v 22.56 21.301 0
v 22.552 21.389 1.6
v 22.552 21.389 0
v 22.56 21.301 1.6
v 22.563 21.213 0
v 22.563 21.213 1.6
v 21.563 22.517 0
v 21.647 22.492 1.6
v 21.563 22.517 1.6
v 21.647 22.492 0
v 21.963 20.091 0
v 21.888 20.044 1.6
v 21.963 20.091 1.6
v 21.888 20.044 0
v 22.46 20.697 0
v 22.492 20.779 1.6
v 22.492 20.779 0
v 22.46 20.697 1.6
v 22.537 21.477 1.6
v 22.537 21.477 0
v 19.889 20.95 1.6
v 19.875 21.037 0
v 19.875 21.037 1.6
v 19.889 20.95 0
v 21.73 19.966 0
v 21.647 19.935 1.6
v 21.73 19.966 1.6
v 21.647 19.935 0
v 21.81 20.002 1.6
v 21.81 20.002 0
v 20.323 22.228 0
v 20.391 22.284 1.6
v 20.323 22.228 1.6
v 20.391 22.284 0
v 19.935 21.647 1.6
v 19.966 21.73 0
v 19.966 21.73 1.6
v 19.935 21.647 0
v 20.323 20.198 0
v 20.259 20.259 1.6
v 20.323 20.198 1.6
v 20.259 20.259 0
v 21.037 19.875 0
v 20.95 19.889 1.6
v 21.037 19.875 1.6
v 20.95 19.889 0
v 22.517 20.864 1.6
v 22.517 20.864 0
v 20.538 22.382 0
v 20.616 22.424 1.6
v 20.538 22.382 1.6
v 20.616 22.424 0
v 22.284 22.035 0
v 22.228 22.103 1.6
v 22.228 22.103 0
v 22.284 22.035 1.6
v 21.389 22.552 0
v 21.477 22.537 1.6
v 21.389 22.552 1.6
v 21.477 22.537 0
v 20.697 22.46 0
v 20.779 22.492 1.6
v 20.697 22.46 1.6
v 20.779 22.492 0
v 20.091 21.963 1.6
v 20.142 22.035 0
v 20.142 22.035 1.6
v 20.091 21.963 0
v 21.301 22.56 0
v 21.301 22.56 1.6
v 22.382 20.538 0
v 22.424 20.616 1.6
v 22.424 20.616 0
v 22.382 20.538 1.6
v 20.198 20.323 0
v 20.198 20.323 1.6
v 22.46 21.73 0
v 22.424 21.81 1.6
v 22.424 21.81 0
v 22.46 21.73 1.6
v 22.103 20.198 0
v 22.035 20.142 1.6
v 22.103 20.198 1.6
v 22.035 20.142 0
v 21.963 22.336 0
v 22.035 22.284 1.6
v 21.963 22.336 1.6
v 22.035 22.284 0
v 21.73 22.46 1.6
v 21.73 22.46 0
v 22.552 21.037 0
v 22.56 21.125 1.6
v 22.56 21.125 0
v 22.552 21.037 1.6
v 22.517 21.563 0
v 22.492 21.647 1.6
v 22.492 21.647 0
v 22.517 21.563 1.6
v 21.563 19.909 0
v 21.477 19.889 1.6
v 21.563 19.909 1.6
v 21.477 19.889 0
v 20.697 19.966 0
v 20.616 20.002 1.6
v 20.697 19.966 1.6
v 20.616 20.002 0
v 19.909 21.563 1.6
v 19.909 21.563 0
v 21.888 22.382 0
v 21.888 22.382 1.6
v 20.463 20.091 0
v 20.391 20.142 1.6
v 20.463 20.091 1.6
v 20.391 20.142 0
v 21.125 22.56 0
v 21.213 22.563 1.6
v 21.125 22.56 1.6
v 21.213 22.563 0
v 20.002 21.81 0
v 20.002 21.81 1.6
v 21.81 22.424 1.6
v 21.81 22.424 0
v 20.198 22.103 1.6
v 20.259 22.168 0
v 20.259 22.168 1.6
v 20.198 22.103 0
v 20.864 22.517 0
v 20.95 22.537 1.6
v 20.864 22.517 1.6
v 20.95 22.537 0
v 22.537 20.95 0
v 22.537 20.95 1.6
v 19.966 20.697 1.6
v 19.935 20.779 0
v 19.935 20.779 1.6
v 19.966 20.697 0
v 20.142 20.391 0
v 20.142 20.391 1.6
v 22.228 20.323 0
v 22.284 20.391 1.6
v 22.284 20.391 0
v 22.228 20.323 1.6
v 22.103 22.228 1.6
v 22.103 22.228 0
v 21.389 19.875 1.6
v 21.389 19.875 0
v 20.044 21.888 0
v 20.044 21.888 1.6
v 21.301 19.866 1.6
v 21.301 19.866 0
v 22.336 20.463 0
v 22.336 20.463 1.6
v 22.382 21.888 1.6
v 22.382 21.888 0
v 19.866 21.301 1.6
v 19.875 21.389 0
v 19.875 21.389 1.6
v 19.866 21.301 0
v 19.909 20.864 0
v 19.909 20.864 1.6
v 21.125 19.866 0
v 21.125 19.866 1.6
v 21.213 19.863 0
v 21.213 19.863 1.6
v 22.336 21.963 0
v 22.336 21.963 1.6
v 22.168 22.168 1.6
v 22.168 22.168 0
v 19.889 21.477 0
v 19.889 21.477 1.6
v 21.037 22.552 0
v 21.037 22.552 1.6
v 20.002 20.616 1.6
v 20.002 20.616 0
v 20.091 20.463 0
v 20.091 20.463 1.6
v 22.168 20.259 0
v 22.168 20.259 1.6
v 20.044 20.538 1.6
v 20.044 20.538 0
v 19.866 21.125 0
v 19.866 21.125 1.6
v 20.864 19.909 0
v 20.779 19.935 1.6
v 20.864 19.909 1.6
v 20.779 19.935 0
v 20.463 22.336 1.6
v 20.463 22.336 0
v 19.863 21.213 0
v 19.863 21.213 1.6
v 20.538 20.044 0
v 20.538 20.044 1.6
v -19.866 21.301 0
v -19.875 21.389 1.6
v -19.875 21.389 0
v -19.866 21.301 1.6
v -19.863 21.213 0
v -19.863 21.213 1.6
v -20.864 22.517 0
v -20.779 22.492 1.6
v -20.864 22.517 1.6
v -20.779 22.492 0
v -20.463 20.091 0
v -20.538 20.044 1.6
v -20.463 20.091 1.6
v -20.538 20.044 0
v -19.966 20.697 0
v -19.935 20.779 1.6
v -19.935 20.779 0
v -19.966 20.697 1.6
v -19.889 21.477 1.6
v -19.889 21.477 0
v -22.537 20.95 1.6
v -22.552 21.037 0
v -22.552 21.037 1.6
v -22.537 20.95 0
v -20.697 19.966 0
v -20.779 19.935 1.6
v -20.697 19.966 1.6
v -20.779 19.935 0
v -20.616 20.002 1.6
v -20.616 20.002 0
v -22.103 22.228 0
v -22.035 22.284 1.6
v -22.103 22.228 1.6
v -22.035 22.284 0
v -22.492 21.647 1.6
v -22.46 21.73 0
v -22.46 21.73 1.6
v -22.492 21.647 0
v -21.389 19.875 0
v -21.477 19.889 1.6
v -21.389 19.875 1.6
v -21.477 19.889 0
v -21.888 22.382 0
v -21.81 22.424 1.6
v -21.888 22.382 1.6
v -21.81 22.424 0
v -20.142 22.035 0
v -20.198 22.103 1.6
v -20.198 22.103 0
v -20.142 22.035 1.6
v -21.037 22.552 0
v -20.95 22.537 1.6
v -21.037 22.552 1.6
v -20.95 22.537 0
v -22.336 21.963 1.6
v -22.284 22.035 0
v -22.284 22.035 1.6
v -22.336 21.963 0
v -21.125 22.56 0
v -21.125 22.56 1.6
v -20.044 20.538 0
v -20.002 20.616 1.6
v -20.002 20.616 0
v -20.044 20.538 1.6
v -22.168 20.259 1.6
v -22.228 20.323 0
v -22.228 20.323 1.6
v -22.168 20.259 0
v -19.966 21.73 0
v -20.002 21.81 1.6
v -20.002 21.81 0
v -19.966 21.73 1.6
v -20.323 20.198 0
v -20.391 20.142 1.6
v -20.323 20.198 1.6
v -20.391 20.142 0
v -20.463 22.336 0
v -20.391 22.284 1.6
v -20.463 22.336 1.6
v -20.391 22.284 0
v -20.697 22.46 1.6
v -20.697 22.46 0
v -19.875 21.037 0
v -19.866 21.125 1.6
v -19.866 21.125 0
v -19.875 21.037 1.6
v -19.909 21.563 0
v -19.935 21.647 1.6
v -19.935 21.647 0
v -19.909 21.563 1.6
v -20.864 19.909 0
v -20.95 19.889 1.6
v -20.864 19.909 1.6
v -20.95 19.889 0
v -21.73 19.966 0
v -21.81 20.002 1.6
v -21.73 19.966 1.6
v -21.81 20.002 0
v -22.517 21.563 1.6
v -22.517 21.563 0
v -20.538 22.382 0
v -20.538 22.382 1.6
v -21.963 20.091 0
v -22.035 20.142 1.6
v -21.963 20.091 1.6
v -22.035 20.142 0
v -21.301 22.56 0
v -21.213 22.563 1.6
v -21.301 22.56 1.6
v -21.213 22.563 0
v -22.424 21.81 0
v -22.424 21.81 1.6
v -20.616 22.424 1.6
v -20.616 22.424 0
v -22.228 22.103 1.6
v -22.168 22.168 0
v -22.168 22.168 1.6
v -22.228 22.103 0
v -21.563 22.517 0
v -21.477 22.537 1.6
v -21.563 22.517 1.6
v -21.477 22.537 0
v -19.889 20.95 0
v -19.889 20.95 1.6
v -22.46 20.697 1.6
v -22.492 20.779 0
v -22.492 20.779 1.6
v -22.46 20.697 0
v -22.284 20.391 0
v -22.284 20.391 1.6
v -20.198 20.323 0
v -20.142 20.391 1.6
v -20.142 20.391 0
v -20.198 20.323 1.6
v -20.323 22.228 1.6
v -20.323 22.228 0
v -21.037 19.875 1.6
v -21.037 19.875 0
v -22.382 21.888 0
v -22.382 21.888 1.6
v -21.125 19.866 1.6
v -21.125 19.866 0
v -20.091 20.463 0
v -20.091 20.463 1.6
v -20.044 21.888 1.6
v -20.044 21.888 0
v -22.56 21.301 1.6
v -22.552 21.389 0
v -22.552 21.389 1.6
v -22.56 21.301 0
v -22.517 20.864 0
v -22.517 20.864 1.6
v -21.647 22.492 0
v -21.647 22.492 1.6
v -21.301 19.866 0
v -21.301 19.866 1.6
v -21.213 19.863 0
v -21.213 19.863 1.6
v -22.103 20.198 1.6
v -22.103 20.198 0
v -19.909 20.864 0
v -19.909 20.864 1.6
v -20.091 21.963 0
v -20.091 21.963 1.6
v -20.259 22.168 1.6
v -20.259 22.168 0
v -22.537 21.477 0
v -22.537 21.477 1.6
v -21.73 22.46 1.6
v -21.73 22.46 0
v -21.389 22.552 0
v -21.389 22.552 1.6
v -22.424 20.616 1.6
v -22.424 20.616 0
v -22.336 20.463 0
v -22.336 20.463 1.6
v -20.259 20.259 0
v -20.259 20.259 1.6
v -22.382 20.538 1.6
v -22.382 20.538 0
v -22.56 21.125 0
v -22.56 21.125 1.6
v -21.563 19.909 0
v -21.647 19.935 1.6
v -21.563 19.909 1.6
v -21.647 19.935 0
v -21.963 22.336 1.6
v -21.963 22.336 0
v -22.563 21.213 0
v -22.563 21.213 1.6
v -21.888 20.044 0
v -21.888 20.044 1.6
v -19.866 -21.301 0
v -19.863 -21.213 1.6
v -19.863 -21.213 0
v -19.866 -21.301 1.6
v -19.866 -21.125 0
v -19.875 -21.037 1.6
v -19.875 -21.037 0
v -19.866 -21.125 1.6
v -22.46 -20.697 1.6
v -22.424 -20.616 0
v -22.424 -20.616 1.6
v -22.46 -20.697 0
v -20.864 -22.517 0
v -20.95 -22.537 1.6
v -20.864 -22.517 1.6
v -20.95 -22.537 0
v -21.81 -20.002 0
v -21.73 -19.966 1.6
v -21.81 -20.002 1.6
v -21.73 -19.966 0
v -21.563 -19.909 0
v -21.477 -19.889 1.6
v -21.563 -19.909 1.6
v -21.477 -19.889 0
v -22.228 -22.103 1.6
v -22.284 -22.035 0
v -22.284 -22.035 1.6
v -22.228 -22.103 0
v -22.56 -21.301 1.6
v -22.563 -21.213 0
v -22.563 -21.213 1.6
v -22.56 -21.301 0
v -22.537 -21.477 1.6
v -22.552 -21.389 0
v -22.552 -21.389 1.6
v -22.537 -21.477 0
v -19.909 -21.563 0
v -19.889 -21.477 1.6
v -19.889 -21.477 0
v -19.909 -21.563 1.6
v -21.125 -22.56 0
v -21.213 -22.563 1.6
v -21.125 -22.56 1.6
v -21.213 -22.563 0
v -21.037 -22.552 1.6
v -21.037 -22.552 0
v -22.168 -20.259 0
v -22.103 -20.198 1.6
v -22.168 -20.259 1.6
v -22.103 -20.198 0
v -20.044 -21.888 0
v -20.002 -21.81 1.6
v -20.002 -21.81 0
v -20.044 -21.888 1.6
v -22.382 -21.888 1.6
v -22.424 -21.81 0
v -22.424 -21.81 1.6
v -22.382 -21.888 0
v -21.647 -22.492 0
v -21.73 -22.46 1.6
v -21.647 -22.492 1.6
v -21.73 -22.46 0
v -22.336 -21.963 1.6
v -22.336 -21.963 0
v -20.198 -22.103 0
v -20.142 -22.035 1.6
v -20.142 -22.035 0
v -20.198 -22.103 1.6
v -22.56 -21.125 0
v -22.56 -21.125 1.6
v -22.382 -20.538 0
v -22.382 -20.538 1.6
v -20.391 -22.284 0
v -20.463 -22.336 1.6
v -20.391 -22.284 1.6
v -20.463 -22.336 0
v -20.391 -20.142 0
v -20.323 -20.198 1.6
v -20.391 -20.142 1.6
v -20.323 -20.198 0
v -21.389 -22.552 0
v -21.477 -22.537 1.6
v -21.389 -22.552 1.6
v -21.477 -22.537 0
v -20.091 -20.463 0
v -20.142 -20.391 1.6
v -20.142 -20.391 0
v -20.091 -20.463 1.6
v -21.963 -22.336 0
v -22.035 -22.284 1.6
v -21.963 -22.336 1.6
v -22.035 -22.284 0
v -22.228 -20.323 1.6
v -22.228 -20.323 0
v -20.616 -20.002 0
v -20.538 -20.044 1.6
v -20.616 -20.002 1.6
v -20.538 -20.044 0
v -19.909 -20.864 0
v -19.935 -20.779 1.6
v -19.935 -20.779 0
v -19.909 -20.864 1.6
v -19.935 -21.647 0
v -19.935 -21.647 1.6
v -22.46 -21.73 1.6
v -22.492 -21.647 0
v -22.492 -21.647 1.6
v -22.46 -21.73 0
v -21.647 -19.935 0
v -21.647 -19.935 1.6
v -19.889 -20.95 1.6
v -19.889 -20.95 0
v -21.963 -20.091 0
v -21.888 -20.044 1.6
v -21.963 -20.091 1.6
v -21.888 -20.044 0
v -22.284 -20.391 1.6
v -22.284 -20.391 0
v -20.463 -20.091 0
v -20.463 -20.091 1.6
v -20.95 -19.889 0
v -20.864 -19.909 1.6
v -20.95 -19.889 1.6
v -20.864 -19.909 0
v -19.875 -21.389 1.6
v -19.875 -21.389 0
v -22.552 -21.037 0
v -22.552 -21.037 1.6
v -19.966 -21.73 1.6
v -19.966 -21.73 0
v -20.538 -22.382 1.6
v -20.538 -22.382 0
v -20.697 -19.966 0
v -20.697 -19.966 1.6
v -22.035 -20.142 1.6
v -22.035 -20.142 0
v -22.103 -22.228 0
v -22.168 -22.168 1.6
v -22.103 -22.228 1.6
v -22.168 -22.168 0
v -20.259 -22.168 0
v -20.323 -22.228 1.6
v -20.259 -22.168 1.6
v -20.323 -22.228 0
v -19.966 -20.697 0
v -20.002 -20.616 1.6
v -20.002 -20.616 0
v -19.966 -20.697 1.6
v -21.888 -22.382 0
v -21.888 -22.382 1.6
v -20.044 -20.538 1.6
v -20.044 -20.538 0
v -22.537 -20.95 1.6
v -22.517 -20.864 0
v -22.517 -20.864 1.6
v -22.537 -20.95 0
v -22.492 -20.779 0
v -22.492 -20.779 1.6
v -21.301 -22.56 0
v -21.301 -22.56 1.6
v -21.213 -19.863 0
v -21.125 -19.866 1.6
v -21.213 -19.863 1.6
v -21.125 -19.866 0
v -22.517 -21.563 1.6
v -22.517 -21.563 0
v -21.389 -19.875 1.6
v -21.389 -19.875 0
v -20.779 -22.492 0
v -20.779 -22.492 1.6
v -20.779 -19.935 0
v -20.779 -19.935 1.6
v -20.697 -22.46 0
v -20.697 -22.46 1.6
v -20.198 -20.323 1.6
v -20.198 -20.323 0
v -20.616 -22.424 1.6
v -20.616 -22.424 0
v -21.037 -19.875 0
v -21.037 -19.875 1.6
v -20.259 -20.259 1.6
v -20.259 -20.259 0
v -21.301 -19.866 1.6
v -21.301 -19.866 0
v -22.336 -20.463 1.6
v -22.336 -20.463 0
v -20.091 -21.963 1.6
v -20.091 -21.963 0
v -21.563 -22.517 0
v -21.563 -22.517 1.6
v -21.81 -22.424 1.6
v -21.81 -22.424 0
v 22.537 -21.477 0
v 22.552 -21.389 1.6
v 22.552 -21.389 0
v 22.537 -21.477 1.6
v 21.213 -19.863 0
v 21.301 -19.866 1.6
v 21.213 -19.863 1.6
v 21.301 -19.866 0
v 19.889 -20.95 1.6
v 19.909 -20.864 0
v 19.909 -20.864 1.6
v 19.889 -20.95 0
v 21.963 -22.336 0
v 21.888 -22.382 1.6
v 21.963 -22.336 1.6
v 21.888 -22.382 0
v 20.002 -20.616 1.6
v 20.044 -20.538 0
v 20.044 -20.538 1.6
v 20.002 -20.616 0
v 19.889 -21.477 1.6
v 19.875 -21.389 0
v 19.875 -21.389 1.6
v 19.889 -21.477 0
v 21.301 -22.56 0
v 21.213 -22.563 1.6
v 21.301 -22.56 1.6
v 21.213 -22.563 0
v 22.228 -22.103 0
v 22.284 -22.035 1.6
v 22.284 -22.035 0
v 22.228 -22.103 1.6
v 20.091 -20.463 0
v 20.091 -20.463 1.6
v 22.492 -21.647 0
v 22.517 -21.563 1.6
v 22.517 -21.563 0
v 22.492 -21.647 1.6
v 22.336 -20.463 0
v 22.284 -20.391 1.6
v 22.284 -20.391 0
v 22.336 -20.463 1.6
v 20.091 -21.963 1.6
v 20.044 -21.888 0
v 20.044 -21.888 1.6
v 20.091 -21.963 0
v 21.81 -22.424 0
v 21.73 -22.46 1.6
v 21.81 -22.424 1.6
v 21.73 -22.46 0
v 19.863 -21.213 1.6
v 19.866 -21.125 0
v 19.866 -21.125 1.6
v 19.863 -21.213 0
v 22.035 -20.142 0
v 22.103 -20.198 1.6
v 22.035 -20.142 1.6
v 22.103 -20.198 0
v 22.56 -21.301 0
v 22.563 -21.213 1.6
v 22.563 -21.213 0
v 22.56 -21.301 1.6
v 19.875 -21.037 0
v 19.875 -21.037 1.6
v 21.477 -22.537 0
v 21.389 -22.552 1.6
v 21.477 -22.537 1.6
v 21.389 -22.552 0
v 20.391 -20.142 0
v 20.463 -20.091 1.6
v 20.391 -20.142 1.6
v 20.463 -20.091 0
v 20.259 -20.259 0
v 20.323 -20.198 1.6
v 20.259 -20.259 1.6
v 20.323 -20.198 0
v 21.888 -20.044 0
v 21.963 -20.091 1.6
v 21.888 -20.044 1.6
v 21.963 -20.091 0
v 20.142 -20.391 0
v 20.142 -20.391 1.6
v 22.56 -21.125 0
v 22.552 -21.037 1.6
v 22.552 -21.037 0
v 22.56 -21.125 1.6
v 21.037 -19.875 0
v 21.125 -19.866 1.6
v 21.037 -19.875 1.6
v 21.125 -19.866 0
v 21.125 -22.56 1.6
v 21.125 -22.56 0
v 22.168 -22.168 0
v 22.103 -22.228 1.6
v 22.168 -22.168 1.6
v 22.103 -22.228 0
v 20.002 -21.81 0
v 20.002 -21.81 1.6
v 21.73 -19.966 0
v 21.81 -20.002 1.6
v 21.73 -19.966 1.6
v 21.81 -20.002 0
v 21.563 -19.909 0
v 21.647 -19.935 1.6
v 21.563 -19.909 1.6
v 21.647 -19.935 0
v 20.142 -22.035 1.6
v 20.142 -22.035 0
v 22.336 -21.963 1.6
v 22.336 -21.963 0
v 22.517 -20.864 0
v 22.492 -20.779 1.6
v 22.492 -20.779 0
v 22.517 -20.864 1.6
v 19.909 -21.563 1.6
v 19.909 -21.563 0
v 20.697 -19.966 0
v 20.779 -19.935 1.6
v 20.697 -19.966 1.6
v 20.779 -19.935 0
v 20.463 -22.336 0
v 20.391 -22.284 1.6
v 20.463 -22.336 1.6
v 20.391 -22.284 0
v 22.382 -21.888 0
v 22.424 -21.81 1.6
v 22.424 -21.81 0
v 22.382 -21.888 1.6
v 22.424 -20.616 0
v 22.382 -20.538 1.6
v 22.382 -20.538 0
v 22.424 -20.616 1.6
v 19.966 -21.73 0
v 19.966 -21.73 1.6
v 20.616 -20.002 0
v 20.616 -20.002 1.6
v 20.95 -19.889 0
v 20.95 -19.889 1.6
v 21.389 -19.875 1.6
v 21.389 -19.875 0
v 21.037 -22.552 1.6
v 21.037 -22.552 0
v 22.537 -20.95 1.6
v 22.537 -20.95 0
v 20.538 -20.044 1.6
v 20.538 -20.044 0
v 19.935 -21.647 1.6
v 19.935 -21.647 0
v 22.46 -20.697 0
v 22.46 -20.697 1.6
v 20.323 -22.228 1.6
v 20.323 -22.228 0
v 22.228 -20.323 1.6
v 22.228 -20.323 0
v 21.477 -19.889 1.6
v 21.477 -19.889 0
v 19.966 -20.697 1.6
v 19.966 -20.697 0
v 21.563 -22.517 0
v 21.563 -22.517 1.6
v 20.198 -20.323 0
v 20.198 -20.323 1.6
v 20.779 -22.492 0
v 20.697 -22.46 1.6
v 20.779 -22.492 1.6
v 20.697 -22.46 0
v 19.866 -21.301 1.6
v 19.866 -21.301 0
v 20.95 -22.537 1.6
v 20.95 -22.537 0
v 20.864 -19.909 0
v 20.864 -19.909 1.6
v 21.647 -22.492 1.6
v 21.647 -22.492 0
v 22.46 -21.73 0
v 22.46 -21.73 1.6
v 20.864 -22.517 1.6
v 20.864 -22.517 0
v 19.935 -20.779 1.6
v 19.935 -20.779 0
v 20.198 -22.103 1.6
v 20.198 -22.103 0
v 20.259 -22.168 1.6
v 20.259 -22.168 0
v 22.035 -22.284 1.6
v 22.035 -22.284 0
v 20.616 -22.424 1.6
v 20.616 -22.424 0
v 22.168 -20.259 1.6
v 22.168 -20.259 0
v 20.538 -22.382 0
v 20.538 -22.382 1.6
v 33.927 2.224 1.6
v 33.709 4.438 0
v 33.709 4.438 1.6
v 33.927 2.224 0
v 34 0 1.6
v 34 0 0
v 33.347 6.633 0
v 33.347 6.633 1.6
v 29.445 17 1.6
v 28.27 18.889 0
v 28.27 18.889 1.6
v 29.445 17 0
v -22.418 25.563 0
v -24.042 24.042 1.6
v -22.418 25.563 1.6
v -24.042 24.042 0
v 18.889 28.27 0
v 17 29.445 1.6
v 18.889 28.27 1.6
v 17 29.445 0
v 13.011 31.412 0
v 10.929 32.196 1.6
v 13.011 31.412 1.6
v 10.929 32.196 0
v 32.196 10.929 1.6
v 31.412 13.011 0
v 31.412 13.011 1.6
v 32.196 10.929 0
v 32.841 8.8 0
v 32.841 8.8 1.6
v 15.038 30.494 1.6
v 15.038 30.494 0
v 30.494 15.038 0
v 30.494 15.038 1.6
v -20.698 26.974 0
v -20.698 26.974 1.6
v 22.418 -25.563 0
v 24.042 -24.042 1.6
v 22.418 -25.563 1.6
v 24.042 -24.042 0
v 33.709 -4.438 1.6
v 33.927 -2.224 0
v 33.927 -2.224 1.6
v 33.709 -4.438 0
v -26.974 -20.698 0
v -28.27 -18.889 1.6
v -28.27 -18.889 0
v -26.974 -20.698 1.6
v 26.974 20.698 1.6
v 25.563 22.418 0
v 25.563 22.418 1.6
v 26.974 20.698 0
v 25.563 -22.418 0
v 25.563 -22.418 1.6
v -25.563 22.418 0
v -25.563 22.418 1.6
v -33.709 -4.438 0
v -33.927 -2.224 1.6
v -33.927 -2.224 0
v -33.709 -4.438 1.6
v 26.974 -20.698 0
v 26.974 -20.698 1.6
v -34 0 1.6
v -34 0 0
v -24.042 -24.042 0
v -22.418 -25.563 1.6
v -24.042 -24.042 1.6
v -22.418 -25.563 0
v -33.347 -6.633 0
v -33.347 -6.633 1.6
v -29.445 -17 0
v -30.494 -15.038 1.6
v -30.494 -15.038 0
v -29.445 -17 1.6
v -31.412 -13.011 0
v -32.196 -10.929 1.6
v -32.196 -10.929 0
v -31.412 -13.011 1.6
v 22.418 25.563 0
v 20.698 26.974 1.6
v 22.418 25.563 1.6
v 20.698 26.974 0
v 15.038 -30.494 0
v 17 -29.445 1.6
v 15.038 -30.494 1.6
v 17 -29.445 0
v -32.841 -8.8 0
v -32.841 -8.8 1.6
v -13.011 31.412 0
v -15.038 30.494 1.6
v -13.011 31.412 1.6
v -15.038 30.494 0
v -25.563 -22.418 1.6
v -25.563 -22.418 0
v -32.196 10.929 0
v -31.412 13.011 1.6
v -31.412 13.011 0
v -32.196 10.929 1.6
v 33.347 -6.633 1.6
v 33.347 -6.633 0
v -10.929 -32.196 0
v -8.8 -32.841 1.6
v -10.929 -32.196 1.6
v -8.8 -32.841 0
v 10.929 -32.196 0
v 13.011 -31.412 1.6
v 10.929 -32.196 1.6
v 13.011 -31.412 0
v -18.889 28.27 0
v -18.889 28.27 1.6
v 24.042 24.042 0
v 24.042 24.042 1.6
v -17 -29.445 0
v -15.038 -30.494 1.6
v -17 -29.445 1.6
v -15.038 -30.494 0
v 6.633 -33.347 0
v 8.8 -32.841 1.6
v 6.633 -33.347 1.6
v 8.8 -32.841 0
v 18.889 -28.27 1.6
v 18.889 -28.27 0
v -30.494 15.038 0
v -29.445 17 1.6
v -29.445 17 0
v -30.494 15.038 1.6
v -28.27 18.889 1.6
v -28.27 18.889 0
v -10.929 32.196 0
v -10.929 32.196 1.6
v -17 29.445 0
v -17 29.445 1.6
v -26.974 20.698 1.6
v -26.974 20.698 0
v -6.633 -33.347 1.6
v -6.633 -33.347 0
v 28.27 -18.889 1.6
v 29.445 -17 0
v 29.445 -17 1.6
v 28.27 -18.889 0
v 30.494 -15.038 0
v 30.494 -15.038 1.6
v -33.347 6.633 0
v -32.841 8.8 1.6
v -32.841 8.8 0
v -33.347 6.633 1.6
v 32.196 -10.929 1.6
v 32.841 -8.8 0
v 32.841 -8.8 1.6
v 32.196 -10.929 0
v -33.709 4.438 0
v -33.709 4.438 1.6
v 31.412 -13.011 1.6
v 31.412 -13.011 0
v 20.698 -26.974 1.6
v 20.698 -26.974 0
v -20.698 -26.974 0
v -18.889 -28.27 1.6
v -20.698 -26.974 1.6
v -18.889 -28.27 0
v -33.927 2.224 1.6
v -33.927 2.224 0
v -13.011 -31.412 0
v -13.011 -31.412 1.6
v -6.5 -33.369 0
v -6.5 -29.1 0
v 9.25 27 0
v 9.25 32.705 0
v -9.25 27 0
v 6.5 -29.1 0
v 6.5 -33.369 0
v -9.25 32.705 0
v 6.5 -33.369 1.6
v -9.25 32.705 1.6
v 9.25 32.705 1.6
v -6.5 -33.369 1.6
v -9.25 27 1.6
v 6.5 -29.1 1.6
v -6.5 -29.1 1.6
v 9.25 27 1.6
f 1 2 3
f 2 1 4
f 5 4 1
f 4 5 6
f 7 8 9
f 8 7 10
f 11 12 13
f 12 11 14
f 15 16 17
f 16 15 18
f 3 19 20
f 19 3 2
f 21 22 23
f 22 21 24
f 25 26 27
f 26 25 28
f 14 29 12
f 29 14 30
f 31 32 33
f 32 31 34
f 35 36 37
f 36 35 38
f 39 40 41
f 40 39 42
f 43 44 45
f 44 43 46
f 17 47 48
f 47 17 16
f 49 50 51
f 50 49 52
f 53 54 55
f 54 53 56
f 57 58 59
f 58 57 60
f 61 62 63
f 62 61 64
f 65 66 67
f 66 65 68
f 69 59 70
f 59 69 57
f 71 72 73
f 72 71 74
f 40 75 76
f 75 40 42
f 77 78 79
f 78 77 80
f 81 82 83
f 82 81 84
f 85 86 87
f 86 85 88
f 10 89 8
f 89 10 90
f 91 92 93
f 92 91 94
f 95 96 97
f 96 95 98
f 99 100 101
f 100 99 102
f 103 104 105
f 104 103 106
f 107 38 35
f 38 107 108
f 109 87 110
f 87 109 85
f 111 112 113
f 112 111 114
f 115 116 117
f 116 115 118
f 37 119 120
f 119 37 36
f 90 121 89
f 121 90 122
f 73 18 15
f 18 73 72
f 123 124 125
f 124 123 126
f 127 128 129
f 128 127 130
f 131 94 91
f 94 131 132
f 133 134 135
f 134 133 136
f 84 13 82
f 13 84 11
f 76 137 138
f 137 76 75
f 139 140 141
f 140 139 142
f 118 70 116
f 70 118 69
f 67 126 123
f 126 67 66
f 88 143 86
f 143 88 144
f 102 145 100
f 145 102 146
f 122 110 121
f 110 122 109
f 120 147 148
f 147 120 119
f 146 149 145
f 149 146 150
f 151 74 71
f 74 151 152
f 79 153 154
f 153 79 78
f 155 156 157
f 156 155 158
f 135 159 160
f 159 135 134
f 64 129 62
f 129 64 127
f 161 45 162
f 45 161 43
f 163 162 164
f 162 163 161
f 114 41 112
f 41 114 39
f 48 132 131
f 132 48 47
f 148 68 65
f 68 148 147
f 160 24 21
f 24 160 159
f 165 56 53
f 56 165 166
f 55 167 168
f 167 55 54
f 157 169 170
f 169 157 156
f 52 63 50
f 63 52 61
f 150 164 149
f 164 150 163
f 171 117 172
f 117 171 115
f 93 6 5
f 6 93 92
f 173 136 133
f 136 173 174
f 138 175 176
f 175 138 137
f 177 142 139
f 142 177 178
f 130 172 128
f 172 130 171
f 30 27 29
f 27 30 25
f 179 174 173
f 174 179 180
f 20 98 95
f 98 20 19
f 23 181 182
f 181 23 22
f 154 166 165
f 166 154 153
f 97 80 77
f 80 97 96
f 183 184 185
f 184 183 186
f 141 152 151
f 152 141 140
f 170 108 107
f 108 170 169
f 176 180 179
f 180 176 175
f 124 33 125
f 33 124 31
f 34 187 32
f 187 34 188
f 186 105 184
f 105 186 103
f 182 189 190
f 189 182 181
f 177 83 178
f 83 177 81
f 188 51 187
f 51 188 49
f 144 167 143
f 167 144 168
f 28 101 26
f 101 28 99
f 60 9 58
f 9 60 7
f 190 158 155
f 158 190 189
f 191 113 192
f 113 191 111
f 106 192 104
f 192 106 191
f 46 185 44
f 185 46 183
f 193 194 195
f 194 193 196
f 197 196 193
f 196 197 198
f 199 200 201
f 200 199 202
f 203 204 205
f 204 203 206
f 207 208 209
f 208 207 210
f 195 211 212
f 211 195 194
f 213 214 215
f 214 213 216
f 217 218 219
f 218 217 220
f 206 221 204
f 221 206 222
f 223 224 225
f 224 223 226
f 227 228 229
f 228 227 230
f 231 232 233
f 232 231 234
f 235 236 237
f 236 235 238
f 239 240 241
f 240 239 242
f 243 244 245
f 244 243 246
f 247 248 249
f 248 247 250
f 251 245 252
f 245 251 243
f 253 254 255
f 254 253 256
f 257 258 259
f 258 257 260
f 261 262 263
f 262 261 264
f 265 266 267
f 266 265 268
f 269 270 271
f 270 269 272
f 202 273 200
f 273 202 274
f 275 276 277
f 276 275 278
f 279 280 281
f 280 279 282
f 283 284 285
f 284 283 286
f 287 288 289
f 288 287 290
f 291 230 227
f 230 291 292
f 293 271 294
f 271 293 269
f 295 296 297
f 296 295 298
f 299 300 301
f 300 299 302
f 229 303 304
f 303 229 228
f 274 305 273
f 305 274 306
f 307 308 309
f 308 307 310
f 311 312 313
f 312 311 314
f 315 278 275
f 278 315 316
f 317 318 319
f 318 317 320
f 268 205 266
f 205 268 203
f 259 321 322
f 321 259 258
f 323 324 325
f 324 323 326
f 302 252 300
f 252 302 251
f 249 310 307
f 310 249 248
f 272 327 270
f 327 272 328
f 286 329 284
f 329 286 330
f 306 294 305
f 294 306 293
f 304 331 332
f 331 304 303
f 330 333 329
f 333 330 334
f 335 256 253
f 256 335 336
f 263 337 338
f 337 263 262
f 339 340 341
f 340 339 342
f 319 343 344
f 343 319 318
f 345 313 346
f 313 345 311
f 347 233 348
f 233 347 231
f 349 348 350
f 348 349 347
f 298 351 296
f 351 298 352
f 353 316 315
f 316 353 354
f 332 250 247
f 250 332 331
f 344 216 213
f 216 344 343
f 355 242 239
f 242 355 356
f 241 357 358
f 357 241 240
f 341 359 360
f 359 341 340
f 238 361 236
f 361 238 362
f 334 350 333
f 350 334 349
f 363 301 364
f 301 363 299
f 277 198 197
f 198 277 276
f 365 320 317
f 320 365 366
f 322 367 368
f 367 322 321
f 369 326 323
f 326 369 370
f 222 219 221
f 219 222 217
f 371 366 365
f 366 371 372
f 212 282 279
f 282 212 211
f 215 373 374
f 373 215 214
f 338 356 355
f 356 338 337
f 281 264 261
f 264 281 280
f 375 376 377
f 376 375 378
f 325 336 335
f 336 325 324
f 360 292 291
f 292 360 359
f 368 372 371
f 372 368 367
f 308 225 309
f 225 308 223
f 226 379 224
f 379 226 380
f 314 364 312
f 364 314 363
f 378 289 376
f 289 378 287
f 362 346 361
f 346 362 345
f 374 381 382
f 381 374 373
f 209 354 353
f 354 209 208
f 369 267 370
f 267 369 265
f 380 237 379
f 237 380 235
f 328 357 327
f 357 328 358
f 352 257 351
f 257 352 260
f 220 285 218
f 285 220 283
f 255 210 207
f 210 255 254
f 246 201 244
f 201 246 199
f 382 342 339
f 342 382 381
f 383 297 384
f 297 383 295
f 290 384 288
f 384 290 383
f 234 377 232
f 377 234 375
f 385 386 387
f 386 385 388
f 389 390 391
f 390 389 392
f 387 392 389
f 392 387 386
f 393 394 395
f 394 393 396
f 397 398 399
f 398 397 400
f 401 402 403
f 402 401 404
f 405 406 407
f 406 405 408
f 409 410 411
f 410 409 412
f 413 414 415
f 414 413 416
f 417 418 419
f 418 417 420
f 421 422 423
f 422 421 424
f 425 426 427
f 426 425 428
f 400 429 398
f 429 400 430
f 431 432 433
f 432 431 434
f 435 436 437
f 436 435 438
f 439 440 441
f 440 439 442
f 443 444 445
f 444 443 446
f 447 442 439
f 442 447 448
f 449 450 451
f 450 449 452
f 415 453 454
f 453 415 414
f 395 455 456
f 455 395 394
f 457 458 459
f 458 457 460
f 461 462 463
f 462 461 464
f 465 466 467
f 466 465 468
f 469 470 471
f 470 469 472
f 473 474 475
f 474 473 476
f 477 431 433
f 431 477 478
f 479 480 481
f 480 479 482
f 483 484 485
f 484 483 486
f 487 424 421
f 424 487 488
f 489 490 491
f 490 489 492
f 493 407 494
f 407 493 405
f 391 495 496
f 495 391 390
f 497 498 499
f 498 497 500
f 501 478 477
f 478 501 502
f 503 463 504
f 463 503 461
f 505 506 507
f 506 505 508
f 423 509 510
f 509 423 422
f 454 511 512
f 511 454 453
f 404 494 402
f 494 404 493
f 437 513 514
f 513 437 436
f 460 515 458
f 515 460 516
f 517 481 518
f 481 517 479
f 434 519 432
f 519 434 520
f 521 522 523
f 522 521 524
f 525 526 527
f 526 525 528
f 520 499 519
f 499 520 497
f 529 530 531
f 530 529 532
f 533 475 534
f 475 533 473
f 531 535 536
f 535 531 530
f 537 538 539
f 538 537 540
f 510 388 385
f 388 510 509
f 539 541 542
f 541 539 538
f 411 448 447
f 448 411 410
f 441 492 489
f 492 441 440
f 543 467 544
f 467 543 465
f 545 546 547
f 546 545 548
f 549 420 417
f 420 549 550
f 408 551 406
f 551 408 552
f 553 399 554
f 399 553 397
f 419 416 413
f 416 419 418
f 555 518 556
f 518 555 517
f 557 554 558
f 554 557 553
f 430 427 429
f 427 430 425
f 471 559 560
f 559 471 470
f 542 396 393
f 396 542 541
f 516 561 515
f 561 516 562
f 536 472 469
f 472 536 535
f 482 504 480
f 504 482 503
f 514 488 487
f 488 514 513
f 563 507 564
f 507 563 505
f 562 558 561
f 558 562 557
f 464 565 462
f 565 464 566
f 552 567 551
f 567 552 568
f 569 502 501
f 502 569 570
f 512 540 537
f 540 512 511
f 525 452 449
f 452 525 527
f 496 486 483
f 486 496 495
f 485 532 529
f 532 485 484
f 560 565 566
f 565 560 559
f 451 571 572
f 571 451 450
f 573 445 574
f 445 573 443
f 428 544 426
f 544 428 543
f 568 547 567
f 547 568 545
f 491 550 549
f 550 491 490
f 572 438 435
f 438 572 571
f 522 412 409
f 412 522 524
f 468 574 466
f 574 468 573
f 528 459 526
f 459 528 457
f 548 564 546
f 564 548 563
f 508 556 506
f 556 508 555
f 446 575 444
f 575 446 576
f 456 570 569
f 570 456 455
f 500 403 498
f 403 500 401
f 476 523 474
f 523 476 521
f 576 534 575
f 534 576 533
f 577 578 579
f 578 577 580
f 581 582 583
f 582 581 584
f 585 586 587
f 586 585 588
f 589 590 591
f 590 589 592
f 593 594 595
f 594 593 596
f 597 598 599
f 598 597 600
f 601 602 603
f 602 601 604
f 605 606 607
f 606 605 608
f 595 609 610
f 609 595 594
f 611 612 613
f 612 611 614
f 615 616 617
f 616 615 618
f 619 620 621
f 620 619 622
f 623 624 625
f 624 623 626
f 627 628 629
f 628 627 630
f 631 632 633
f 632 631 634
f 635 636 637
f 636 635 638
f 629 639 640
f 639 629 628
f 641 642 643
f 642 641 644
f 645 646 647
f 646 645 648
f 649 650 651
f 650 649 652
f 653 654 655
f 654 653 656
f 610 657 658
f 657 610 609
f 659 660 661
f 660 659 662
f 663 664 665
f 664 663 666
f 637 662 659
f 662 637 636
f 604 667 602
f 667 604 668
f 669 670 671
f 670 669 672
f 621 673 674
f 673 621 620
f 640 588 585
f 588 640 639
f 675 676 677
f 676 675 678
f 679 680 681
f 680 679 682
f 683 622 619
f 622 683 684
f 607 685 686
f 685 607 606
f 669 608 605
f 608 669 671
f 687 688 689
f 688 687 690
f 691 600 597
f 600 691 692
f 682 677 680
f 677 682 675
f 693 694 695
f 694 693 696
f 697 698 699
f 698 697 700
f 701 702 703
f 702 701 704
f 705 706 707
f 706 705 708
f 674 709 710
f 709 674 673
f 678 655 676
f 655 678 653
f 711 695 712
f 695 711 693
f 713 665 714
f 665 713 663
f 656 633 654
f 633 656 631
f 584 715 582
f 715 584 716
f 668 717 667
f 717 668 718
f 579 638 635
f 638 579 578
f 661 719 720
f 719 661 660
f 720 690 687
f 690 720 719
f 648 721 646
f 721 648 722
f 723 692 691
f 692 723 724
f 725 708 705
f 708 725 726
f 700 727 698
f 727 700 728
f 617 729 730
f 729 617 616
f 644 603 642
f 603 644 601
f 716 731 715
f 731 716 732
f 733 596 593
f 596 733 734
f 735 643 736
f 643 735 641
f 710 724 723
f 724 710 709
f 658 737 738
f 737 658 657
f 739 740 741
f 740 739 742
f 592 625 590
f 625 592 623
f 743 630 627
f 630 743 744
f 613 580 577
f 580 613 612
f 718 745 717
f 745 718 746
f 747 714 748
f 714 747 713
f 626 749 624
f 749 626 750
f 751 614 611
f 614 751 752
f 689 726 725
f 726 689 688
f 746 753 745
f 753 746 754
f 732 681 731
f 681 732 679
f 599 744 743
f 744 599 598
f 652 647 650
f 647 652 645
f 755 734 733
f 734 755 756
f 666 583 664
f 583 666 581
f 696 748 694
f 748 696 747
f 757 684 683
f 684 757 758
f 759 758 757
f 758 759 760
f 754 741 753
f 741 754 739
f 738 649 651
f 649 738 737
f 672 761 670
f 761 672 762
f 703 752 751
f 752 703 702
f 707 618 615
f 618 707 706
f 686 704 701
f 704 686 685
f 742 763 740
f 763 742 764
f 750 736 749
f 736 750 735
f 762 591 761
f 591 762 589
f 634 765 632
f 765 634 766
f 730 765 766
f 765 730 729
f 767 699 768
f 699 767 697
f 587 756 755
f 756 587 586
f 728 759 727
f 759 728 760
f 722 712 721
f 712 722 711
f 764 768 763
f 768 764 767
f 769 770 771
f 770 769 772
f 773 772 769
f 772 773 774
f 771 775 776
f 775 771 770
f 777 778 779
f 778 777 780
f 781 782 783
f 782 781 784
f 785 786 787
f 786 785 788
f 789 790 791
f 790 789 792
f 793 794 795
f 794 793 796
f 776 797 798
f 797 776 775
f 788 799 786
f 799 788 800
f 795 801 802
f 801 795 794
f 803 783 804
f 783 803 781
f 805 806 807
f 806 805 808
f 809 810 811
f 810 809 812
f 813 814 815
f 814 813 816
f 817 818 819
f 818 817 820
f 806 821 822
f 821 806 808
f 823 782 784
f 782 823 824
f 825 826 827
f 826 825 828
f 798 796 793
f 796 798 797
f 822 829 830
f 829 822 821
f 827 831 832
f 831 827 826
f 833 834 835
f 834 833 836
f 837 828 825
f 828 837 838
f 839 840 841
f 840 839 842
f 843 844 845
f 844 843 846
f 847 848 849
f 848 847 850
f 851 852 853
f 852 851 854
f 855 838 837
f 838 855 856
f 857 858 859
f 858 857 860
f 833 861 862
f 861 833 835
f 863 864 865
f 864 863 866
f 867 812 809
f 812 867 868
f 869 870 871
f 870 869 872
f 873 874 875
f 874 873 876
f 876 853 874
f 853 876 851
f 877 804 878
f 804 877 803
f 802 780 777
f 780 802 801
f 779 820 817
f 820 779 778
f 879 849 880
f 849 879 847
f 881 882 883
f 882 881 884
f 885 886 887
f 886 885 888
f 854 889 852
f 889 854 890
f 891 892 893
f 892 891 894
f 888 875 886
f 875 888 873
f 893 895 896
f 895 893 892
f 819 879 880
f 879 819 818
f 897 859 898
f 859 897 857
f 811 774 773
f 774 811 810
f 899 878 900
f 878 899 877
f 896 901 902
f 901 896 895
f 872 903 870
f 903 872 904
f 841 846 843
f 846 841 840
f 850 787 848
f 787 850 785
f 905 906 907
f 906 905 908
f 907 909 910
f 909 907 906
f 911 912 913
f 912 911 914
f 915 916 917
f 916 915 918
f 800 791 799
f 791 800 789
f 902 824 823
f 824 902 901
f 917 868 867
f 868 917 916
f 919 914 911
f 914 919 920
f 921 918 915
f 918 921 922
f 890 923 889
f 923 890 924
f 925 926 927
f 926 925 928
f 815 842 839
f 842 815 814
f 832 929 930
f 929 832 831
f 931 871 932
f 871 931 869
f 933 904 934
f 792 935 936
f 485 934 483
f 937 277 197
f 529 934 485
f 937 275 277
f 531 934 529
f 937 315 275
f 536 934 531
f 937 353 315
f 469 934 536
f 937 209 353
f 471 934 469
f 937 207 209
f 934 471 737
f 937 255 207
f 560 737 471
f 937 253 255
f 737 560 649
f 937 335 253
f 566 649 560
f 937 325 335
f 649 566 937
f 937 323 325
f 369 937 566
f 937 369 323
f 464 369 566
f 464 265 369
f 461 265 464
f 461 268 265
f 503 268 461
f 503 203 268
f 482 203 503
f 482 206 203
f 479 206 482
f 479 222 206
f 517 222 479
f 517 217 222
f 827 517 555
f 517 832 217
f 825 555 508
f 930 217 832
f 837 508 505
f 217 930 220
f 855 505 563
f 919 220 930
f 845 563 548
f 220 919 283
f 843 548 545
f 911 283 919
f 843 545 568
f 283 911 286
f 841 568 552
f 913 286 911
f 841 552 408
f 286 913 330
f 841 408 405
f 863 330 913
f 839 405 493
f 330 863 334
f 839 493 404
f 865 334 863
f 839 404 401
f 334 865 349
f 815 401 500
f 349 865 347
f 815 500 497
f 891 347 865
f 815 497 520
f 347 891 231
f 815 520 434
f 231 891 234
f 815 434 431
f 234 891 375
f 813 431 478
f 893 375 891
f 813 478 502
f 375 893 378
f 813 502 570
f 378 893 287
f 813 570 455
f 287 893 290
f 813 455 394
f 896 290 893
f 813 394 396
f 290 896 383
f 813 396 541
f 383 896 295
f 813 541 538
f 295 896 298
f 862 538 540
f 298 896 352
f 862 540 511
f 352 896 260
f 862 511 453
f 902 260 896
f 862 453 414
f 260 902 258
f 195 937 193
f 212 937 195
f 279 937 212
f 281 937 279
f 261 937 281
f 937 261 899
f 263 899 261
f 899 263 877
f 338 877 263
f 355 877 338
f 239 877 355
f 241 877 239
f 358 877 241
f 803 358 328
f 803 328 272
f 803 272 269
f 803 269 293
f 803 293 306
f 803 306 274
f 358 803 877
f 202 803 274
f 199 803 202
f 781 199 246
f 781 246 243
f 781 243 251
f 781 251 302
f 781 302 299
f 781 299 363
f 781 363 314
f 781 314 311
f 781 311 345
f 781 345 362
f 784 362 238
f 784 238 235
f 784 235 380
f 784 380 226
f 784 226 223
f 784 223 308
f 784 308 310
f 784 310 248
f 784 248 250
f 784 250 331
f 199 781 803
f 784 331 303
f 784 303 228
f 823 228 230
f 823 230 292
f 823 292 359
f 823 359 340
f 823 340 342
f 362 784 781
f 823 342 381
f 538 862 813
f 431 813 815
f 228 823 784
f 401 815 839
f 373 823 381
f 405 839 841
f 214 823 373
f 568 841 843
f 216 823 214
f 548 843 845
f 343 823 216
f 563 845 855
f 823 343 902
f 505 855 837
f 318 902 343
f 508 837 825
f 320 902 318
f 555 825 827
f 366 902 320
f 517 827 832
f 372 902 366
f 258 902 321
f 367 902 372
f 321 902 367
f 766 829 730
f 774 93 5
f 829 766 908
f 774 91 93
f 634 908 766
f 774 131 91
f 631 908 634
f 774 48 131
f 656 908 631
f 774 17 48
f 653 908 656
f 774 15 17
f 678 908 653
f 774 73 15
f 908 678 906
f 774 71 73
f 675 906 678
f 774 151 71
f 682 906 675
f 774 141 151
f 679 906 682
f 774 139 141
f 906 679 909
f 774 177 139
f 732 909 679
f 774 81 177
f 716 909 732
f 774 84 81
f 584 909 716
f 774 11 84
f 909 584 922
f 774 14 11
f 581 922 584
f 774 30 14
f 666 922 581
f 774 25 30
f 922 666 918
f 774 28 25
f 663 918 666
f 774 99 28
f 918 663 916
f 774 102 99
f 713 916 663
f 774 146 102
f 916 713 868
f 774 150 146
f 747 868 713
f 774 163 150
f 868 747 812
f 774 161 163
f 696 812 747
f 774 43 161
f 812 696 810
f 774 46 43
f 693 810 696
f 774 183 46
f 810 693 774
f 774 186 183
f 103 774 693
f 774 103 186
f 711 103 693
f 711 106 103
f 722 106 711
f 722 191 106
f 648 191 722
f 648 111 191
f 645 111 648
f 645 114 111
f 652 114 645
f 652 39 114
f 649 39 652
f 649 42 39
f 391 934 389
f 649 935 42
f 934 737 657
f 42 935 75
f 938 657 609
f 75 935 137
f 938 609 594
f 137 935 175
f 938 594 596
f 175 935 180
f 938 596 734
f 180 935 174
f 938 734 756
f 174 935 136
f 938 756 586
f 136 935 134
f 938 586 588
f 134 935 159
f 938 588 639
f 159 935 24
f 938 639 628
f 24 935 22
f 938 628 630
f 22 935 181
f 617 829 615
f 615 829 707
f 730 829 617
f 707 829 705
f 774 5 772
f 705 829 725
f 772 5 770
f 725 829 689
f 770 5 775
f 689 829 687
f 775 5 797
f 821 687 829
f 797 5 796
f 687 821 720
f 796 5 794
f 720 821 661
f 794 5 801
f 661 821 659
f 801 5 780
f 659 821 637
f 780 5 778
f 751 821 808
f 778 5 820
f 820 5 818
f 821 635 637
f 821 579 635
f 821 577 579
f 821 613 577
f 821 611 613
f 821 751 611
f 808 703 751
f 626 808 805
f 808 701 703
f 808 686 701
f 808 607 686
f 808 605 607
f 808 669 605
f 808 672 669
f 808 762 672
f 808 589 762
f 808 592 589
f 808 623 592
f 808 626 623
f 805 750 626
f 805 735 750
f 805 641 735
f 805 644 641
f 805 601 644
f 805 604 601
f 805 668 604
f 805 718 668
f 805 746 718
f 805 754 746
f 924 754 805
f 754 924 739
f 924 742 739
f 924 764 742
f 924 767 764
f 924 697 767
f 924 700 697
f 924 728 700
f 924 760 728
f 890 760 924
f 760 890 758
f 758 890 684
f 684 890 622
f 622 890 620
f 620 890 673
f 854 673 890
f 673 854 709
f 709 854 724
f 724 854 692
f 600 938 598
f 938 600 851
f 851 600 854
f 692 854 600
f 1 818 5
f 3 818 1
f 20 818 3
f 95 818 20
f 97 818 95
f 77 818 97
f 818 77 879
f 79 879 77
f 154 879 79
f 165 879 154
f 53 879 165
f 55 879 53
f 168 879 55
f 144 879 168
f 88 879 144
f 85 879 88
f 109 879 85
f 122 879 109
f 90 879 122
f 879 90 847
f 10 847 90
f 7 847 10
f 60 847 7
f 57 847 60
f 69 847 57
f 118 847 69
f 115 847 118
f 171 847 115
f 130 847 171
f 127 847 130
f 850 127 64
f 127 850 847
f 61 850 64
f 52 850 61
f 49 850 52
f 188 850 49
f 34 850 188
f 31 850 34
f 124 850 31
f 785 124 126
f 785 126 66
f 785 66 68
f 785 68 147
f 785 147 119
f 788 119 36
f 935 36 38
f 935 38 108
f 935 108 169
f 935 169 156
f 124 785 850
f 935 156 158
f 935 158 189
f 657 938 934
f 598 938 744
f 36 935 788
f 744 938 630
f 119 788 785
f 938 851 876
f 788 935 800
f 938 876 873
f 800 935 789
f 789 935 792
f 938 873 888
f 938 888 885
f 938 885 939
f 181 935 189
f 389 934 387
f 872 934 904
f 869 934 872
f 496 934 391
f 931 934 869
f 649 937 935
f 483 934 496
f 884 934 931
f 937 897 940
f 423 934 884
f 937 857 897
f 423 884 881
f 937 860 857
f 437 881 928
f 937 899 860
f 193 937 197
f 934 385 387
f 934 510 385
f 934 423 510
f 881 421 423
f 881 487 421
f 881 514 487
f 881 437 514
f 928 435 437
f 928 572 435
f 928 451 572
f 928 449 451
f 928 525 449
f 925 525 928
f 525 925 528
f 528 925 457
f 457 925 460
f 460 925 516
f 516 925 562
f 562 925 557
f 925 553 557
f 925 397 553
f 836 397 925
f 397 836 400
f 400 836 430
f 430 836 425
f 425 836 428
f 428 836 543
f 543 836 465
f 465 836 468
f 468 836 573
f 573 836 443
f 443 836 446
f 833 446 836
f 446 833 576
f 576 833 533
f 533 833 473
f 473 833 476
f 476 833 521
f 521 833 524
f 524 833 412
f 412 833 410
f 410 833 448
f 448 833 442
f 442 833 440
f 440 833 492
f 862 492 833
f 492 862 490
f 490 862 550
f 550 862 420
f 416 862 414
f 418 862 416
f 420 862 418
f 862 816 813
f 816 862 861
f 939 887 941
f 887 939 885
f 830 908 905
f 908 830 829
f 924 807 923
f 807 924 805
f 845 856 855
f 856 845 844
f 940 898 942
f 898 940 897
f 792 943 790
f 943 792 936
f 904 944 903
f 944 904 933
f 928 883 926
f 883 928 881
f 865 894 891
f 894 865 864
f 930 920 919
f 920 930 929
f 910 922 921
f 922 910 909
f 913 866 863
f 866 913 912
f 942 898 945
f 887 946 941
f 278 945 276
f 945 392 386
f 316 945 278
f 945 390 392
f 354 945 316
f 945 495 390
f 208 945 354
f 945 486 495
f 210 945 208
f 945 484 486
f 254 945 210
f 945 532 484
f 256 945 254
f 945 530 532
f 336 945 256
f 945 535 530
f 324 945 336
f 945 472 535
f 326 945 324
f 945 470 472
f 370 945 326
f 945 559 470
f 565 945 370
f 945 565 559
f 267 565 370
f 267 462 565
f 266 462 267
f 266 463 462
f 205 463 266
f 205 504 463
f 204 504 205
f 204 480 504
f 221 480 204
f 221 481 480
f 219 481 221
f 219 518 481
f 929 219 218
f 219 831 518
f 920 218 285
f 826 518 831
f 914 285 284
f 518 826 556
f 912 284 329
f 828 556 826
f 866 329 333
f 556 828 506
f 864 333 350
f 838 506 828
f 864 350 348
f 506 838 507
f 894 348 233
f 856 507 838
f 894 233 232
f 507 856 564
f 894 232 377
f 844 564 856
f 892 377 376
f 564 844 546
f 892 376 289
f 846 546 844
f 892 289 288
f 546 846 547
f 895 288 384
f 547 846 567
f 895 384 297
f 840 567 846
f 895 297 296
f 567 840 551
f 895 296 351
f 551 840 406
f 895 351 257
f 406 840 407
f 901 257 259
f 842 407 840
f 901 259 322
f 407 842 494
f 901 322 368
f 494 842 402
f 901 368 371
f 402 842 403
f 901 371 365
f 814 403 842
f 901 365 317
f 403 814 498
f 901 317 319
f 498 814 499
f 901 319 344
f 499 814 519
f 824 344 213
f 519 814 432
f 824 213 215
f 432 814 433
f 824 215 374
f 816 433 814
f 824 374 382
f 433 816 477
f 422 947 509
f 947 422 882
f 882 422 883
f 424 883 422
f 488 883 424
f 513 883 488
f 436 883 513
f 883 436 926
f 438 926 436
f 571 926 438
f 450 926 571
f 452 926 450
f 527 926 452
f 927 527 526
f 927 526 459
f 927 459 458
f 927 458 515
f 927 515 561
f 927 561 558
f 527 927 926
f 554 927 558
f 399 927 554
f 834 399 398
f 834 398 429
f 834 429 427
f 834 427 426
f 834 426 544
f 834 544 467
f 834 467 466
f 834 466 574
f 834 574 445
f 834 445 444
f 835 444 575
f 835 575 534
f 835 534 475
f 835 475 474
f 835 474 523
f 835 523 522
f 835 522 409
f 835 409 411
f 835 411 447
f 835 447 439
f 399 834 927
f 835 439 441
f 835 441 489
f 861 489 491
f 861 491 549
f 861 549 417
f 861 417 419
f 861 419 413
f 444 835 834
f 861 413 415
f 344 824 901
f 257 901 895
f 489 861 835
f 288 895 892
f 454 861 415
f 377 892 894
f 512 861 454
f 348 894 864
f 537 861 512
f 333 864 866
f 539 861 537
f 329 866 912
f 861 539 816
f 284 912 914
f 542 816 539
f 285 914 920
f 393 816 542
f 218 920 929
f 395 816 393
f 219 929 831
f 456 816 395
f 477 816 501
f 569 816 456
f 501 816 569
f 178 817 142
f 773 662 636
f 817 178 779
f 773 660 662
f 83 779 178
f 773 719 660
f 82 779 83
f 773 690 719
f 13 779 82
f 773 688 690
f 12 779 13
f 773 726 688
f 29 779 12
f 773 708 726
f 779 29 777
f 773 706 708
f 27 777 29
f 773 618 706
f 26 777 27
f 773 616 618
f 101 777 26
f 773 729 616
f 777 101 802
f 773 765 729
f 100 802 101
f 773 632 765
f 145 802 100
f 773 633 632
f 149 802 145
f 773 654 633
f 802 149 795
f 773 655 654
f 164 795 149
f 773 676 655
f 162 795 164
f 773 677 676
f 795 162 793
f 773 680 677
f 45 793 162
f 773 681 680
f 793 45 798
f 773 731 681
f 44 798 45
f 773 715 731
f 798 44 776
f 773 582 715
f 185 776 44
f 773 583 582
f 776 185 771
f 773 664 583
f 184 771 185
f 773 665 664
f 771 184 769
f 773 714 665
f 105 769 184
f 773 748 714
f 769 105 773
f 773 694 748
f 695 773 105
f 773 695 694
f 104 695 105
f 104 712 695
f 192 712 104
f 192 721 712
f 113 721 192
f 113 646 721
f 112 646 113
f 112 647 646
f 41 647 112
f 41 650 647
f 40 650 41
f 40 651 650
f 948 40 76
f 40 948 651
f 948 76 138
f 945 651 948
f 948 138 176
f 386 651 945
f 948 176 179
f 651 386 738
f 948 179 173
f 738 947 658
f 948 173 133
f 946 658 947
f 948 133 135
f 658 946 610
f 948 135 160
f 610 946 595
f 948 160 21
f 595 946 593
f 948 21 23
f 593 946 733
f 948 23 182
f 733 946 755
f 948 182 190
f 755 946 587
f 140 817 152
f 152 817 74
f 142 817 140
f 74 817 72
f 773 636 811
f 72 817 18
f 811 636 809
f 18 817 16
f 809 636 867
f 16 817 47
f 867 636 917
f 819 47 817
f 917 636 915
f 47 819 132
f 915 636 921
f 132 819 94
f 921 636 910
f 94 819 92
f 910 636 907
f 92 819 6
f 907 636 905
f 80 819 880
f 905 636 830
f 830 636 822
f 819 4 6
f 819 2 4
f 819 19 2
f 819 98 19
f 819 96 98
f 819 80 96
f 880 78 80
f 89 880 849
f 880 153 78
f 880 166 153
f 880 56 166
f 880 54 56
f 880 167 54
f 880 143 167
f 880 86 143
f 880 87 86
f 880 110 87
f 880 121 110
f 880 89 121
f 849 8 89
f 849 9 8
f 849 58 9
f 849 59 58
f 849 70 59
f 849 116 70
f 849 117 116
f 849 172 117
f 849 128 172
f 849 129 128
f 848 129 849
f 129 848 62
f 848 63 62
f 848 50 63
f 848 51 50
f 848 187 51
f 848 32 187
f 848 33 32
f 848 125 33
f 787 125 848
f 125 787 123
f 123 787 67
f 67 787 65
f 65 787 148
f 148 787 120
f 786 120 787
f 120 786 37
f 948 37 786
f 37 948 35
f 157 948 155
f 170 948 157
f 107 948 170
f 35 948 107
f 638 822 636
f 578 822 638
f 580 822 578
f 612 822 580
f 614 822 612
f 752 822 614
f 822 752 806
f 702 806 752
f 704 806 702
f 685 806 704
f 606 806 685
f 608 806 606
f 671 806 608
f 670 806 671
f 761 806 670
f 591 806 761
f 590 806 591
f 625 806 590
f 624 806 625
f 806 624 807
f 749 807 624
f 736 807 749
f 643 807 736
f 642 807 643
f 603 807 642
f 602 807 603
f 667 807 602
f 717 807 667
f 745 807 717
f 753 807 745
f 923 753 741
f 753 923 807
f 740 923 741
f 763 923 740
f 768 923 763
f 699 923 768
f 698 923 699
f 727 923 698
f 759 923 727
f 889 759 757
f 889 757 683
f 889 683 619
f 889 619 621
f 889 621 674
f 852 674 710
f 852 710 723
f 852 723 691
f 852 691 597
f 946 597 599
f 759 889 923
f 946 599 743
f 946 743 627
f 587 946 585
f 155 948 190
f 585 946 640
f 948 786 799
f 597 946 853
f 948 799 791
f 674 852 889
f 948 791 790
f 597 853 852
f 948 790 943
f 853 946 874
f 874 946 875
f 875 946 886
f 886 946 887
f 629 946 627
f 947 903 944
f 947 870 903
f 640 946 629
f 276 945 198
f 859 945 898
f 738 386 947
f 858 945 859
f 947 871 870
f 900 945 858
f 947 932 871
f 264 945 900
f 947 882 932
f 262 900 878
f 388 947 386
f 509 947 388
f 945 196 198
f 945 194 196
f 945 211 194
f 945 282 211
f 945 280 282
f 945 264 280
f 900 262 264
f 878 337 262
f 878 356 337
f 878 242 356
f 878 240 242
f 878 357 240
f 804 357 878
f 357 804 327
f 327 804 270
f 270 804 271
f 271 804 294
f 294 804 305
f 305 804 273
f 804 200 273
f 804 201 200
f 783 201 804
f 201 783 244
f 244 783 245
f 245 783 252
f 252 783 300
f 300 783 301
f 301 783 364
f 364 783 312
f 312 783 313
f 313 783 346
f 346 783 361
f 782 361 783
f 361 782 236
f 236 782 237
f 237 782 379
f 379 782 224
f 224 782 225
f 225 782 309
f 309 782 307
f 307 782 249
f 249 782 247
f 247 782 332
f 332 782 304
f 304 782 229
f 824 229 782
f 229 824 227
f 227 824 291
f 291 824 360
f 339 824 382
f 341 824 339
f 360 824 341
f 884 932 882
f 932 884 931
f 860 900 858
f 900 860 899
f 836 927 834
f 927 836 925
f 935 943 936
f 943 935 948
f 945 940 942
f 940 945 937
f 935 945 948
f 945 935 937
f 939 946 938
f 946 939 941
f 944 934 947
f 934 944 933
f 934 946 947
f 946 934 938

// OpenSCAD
// ESP32 EFIS — electronics, control and rear-service hardware
// Supplementary/non-primary flight-development instrument
// Units: mm
$fn=96;
cover_t=3.0;rear_lip_h=3.0;body_od=79.60;wall=3.0;rear_open_d=body_od-2*wall;cover_clearance=.35;cover_spigot_d=rear_open_d-2*cover_clearance;cover_flange_d=body_od-.8;rear_screw_circle_d=66;rear_screw_d=3.2;usb_slot_w=13;usb_slot_h=7;
bezel_od=70;bezel_id=55;bezel_t=2.5;bezel_spigot_h=1.5;bezel_spigot_d=62.70;bezel_screw_circle_d=67;bezel_screw_d=2.2;encoder_pod_x=14;encoder_pod_y=14;encoder_pod_depth=9;encoder_pod_center_y=-37;encoder_panel_hole_d=7.2;encoder_body_x=11.5;encoder_body_y=11.5;encoder_body_depth=6.5;
pcb_d=68;pcb_t=1.6;pcb_mount_pcd=60;pcb_mount_hole_d=2.7;antenna_keepout_x=18.5;antenna_keepout_y=7;
electronics_standoff_pcd=pcb_mount_pcd;electronics_standoff_d=6;electronics_standoff_h=10;electronics_standoff_pilot_d=2;
usb_clamp_center_y=-31;usb_clamp_hole_pitch=16;usb_clamp_hole_d=3.2;usb_clamp_x=22;usb_clamp_y=12;usb_clamp_z=4;usb_cable_d=5;
module front_bezel_with_encoder(){difference(){union(){difference(){cylinder(d=bezel_od,h=bezel_t);translate([0,0,-.1])cylinder(d=bezel_id,h=bezel_t+.2);}translate([0,0,bezel_t])difference(){cylinder(d=bezel_spigot_d,h=bezel_spigot_h);translate([0,0,-.1])cylinder(d=bezel_id,h=bezel_spigot_h+.2);}translate([-encoder_pod_x/2,encoder_pod_center_y-encoder_pod_y/2,0])cube([encoder_pod_x,encoder_pod_y,encoder_pod_depth]);}for(a=[0,90,180,270]){x=(bezel_screw_circle_d/2)*cos(a);y=(bezel_screw_circle_d/2)*sin(a);translate([x,y,-.1])cylinder(d=bezel_screw_d,h=bezel_t+bezel_spigot_h+.3);}translate([-encoder_body_x/2,encoder_pod_center_y-encoder_body_y/2,-.1])cube([encoder_body_x,encoder_body_y,encoder_body_depth+.1]);translate([0,encoder_pod_center_y,encoder_body_depth-.05])cylinder(d=encoder_panel_hole_d,h=encoder_pod_depth-encoder_body_depth+.2);}}
module pcb_fit_gauge(){difference(){cylinder(d=pcb_d,h=pcb_t);for(a=[45,135,225,315]){x=(pcb_mount_pcd/2)*cos(a);y=(pcb_mount_pcd/2)*sin(a);translate([x,y,-.1])cylinder(d=pcb_mount_hole_d,h=pcb_t+.2);}translate([-antenna_keepout_x/2,pcb_d/2-antenna_keepout_y,-.1])cube([antenna_keepout_x,antenna_keepout_y+.2,pcb_t+.2]);translate([-usb_slot_w/2,-pcb_d/2-.1,-.1])cube([usb_slot_w,5,pcb_t+.2]);}}
module rear_cover_service(){difference(){union(){cylinder(d=cover_flange_d,h=cover_t);translate([0,0,cover_t])cylinder(d=cover_spigot_d,h=rear_lip_h);for(a=[45,135,225,315]){x=(electronics_standoff_pcd/2)*cos(a);y=(electronics_standoff_pcd/2)*sin(a);translate([x,y,cover_t+rear_lip_h])difference(){cylinder(d=electronics_standoff_d,h=electronics_standoff_h);cylinder(d=electronics_standoff_pilot_d,h=electronics_standoff_h+.2);}}}for(a=[45,135,225,315]){x=(rear_screw_circle_d/2)*cos(a);y=(rear_screw_circle_d/2)*sin(a);translate([x,y,-.1])cylinder(d=rear_screw_d,h=cover_t+rear_lip_h+.3);}translate([-usb_slot_w/2,-cover_flange_d/2-.1,.8])cube([usb_slot_w,usb_slot_h+2,cover_t+rear_lip_h]);for(x=[-usb_clamp_hole_pitch/2,usb_clamp_hole_pitch/2])translate([x,usb_clamp_center_y,-.1])cylinder(d=usb_clamp_hole_d,h=cover_t+rear_lip_h+.3);}}
module usb_strain_relief_clamp(){difference(){translate([-usb_clamp_x/2,-usb_clamp_y/2,0])cube([usb_clamp_x,usb_clamp_y,usb_clamp_z]);for(x=[-usb_clamp_hole_pitch/2,usb_clamp_hole_pitch/2])translate([x,0,-.1])cylinder(d=usb_clamp_hole_d,h=usb_clamp_z+.2);translate([0,0,0])rotate([90,0,0])cylinder(d=usb_cable_d,h=usb_clamp_y+.4,center=true);}}
part="PCB_FIT_GAUGE";
if(part=="FRONT_BEZEL_CONTROL")front_bezel_with_encoder();if(part=="PCB_FIT_GAUGE")pcb_fit_gauge();if(part=="REAR_COVER_SERVICE")rear_cover_service();if(part=="USB_CLAMP")usb_strain_relief_clamp();
